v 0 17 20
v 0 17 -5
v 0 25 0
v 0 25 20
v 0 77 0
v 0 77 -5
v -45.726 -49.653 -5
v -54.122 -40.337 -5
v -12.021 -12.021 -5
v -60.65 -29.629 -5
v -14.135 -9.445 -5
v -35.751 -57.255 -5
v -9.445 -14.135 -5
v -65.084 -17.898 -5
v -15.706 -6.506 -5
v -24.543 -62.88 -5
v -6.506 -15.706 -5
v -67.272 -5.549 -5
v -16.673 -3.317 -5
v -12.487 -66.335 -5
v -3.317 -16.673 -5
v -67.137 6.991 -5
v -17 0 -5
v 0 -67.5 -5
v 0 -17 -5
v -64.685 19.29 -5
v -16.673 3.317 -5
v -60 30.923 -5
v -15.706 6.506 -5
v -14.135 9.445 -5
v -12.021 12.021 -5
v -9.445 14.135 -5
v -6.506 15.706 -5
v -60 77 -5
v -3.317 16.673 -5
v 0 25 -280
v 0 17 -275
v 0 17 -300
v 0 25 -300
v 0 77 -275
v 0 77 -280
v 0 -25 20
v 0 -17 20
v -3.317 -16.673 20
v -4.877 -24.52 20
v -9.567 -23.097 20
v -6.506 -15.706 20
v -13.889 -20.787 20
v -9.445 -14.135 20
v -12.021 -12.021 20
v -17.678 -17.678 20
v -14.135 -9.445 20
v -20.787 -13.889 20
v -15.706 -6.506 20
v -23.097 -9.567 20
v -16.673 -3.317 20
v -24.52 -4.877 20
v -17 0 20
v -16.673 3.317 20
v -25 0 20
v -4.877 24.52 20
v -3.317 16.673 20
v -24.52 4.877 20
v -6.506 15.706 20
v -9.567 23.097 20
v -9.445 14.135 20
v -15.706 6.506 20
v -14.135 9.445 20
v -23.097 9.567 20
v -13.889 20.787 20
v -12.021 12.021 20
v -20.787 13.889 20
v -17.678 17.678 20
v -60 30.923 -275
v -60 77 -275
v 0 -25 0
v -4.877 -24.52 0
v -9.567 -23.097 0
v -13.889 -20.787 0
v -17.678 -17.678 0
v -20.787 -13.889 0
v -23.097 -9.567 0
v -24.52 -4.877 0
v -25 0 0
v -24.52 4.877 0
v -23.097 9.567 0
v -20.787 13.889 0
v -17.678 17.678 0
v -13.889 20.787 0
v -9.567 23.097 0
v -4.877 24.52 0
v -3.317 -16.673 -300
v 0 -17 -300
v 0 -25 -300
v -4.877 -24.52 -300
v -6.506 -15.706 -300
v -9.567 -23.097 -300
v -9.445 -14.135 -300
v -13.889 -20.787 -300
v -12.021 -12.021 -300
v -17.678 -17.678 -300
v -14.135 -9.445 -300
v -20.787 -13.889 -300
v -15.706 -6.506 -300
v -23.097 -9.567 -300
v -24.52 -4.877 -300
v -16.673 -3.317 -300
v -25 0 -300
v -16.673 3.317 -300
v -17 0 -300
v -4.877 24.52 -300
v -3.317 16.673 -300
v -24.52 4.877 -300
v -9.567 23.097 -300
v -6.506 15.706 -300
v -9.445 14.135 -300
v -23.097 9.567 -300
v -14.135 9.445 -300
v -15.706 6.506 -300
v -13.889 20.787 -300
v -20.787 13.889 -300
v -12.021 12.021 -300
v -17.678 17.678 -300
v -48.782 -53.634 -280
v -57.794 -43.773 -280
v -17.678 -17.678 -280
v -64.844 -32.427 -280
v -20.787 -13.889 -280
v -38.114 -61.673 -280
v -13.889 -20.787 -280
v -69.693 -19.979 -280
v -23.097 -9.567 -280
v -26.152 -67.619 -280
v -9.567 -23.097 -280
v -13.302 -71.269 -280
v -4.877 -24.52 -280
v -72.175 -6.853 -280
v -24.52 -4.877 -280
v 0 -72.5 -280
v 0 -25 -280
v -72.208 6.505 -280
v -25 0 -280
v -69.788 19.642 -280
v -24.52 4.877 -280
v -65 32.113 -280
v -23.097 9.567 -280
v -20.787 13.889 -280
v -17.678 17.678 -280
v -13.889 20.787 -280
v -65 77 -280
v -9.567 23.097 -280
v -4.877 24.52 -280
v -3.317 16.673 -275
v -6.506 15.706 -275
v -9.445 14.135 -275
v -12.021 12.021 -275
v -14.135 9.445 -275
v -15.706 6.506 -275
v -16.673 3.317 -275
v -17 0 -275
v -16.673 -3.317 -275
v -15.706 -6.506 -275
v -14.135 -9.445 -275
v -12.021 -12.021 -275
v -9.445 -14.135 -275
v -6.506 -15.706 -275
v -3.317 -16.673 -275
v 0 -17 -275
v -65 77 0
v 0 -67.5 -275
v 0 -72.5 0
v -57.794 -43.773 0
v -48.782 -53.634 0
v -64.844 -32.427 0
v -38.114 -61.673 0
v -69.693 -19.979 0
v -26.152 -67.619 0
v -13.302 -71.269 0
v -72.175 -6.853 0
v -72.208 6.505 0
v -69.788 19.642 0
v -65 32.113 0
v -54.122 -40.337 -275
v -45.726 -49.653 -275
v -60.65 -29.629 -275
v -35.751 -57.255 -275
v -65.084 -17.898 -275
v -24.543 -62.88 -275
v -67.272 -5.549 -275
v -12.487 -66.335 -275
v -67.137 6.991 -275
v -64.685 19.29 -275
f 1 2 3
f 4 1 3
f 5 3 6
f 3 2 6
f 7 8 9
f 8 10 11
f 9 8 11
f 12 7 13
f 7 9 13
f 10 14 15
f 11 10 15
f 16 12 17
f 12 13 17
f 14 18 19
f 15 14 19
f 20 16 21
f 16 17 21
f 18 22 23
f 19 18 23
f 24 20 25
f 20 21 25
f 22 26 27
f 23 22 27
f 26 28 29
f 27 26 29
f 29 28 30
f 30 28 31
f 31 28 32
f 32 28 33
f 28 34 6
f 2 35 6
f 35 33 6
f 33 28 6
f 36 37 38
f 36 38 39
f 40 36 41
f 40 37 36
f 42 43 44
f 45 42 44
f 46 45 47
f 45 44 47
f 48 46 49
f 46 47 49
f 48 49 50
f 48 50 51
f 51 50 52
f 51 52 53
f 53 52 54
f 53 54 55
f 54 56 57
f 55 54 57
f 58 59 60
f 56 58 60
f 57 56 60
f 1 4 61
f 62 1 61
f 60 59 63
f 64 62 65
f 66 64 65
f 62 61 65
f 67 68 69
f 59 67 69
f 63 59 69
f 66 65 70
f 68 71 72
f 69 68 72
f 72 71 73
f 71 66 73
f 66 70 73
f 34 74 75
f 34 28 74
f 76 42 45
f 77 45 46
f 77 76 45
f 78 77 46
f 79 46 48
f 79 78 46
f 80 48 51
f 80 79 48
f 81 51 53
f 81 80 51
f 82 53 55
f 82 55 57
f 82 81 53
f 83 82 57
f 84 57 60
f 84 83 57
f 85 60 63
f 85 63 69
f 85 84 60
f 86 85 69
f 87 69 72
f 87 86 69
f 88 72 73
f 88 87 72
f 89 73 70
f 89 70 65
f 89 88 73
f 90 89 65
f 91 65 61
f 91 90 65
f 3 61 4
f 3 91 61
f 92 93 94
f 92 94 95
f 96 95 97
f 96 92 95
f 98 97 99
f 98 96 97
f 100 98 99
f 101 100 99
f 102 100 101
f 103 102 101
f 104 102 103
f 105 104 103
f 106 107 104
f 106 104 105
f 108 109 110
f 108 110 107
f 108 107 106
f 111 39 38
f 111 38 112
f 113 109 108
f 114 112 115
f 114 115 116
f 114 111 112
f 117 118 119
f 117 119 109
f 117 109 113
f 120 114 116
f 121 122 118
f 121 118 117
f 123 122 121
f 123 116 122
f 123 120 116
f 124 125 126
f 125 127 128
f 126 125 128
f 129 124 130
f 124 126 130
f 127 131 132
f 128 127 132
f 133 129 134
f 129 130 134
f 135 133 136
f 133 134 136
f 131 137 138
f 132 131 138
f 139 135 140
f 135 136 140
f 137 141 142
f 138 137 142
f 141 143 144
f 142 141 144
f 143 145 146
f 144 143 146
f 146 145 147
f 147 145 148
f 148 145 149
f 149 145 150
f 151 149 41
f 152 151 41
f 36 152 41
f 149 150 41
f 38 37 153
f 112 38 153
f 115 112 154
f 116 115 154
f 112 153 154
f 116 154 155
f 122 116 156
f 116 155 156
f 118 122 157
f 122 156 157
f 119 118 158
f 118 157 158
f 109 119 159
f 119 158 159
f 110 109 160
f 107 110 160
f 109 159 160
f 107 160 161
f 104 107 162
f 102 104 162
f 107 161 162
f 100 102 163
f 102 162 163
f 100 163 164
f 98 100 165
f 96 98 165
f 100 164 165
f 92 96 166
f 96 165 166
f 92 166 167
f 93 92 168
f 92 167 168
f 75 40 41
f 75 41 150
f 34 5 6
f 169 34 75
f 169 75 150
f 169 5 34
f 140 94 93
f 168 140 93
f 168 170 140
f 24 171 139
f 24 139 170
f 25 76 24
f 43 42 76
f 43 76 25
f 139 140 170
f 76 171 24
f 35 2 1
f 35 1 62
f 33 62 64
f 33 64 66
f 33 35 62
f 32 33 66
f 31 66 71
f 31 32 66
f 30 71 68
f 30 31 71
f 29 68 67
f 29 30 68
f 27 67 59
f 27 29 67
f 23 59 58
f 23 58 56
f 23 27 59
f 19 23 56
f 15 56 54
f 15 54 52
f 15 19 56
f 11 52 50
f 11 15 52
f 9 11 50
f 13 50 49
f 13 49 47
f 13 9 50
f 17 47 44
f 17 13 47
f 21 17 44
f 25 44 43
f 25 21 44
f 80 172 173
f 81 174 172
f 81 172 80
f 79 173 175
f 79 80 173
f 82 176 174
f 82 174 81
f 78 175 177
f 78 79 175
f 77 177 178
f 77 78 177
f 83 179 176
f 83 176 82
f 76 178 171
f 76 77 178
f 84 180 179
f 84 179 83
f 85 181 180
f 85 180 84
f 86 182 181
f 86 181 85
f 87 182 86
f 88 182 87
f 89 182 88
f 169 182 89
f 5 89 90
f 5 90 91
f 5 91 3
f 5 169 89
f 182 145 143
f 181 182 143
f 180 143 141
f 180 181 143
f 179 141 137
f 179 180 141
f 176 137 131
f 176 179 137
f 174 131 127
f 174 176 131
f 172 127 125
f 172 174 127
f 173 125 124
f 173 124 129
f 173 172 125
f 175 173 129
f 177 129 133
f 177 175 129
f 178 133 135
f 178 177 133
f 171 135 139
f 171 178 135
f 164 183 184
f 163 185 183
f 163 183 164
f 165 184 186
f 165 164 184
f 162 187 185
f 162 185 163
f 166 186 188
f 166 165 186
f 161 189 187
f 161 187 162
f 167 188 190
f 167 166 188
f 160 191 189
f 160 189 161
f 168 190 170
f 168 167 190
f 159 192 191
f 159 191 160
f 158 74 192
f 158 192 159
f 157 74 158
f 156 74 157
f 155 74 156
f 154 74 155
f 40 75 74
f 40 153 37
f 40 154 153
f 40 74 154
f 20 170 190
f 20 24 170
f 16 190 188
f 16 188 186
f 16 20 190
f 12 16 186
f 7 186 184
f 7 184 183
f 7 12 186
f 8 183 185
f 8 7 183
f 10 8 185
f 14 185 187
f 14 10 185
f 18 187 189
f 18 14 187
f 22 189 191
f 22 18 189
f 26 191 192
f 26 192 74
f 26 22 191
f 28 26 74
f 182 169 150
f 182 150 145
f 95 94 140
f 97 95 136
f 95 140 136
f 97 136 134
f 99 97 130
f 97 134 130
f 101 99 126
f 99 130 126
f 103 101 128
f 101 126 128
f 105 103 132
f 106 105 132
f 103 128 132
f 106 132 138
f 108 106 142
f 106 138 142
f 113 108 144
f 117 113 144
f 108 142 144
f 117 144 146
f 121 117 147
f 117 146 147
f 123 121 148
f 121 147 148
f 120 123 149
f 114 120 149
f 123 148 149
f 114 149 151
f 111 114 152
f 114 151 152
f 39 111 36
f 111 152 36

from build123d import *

# Parameters (mm, degrees)
BOSS_EXTRUDE1_DEPTH      = 20
BOSS_EXTRUDE1_DEPTH_BACK = 5
BOSS_EXTRUDE2_START      = -5
BOSS_EXTRUDE2_DEPTH      = 5
BOSS_EXTRUDE3_START      = 135
BOSS_EXTRUDE3_DEPTH      = 135


with BuildPart() as part:
    # Sketch1 → Boss-Extrude1 (new, two sides: drawn at the far end of the back side and taken through both)
    with BuildSketch(Plane.XY.offset(-BOSS_EXTRUDE1_DEPTH_BACK)):
        with BuildLine():
            Line((0, 25), (0, 17))
            ThreePointArc((0, 17), (-17, 0), (0, -17))
            Line((0, -17), (0, -25))
            ThreePointArc((0, -25), (-25, 0), (0, 25))
        make_face()
    extrude(amount=BOSS_EXTRUDE1_DEPTH + BOSS_EXTRUDE1_DEPTH_BACK)

    # Sketch2 → Boss-Extrude2 (add)
    with BuildSketch(Plane.XY.offset(BOSS_EXTRUDE2_START)):
        with BuildLine():
            Line((0, 25), (0, 77))
            Line((0, 77), (-65, 77))
            Line((-65, 77), (-65, 32.113081447))
            ThreePointArc((-65, 32.113081447), (-61.581037686, -38.262590053), (0, -72.5))
            Line((0, -72.5), (0, -25))
            ThreePointArc((0, -25), (-25, 0), (0, 25))
        make_face()
    extrude(amount=BOSS_EXTRUDE2_DEPTH)

    # Sketch3 → Boss-Extrude3 (add)
    with BuildSketch(Plane(origin=(0, 0, -5), x_dir=(-1, 0, 0), z_dir=(0, 0, -1)).offset(BOSS_EXTRUDE3_START)):
        with BuildLine():
            Line((60, 30.923292192), (60, 77))
            Line((60, 77), (65, 77))
            Line((65, 77), (65, 32.113081447))
            ThreePointArc((65, 32.113081447), (61.581037686, -38.262590053), (0, -72.5))
            Line((0, -72.5), (0, -67.5))
            ThreePointArc((0, -67.5), (57.634938288, -35.134938288), (60, 30.923292192))
        make_face()
    extrude(amount=-BOSS_EXTRUDE3_DEPTH)

    # Mirror5: part across plane


with BuildPart() as part_1:
    add(part.part)
    add(part.part.mirror(Plane.XY.offset(-140)))


solid = part_1.part
